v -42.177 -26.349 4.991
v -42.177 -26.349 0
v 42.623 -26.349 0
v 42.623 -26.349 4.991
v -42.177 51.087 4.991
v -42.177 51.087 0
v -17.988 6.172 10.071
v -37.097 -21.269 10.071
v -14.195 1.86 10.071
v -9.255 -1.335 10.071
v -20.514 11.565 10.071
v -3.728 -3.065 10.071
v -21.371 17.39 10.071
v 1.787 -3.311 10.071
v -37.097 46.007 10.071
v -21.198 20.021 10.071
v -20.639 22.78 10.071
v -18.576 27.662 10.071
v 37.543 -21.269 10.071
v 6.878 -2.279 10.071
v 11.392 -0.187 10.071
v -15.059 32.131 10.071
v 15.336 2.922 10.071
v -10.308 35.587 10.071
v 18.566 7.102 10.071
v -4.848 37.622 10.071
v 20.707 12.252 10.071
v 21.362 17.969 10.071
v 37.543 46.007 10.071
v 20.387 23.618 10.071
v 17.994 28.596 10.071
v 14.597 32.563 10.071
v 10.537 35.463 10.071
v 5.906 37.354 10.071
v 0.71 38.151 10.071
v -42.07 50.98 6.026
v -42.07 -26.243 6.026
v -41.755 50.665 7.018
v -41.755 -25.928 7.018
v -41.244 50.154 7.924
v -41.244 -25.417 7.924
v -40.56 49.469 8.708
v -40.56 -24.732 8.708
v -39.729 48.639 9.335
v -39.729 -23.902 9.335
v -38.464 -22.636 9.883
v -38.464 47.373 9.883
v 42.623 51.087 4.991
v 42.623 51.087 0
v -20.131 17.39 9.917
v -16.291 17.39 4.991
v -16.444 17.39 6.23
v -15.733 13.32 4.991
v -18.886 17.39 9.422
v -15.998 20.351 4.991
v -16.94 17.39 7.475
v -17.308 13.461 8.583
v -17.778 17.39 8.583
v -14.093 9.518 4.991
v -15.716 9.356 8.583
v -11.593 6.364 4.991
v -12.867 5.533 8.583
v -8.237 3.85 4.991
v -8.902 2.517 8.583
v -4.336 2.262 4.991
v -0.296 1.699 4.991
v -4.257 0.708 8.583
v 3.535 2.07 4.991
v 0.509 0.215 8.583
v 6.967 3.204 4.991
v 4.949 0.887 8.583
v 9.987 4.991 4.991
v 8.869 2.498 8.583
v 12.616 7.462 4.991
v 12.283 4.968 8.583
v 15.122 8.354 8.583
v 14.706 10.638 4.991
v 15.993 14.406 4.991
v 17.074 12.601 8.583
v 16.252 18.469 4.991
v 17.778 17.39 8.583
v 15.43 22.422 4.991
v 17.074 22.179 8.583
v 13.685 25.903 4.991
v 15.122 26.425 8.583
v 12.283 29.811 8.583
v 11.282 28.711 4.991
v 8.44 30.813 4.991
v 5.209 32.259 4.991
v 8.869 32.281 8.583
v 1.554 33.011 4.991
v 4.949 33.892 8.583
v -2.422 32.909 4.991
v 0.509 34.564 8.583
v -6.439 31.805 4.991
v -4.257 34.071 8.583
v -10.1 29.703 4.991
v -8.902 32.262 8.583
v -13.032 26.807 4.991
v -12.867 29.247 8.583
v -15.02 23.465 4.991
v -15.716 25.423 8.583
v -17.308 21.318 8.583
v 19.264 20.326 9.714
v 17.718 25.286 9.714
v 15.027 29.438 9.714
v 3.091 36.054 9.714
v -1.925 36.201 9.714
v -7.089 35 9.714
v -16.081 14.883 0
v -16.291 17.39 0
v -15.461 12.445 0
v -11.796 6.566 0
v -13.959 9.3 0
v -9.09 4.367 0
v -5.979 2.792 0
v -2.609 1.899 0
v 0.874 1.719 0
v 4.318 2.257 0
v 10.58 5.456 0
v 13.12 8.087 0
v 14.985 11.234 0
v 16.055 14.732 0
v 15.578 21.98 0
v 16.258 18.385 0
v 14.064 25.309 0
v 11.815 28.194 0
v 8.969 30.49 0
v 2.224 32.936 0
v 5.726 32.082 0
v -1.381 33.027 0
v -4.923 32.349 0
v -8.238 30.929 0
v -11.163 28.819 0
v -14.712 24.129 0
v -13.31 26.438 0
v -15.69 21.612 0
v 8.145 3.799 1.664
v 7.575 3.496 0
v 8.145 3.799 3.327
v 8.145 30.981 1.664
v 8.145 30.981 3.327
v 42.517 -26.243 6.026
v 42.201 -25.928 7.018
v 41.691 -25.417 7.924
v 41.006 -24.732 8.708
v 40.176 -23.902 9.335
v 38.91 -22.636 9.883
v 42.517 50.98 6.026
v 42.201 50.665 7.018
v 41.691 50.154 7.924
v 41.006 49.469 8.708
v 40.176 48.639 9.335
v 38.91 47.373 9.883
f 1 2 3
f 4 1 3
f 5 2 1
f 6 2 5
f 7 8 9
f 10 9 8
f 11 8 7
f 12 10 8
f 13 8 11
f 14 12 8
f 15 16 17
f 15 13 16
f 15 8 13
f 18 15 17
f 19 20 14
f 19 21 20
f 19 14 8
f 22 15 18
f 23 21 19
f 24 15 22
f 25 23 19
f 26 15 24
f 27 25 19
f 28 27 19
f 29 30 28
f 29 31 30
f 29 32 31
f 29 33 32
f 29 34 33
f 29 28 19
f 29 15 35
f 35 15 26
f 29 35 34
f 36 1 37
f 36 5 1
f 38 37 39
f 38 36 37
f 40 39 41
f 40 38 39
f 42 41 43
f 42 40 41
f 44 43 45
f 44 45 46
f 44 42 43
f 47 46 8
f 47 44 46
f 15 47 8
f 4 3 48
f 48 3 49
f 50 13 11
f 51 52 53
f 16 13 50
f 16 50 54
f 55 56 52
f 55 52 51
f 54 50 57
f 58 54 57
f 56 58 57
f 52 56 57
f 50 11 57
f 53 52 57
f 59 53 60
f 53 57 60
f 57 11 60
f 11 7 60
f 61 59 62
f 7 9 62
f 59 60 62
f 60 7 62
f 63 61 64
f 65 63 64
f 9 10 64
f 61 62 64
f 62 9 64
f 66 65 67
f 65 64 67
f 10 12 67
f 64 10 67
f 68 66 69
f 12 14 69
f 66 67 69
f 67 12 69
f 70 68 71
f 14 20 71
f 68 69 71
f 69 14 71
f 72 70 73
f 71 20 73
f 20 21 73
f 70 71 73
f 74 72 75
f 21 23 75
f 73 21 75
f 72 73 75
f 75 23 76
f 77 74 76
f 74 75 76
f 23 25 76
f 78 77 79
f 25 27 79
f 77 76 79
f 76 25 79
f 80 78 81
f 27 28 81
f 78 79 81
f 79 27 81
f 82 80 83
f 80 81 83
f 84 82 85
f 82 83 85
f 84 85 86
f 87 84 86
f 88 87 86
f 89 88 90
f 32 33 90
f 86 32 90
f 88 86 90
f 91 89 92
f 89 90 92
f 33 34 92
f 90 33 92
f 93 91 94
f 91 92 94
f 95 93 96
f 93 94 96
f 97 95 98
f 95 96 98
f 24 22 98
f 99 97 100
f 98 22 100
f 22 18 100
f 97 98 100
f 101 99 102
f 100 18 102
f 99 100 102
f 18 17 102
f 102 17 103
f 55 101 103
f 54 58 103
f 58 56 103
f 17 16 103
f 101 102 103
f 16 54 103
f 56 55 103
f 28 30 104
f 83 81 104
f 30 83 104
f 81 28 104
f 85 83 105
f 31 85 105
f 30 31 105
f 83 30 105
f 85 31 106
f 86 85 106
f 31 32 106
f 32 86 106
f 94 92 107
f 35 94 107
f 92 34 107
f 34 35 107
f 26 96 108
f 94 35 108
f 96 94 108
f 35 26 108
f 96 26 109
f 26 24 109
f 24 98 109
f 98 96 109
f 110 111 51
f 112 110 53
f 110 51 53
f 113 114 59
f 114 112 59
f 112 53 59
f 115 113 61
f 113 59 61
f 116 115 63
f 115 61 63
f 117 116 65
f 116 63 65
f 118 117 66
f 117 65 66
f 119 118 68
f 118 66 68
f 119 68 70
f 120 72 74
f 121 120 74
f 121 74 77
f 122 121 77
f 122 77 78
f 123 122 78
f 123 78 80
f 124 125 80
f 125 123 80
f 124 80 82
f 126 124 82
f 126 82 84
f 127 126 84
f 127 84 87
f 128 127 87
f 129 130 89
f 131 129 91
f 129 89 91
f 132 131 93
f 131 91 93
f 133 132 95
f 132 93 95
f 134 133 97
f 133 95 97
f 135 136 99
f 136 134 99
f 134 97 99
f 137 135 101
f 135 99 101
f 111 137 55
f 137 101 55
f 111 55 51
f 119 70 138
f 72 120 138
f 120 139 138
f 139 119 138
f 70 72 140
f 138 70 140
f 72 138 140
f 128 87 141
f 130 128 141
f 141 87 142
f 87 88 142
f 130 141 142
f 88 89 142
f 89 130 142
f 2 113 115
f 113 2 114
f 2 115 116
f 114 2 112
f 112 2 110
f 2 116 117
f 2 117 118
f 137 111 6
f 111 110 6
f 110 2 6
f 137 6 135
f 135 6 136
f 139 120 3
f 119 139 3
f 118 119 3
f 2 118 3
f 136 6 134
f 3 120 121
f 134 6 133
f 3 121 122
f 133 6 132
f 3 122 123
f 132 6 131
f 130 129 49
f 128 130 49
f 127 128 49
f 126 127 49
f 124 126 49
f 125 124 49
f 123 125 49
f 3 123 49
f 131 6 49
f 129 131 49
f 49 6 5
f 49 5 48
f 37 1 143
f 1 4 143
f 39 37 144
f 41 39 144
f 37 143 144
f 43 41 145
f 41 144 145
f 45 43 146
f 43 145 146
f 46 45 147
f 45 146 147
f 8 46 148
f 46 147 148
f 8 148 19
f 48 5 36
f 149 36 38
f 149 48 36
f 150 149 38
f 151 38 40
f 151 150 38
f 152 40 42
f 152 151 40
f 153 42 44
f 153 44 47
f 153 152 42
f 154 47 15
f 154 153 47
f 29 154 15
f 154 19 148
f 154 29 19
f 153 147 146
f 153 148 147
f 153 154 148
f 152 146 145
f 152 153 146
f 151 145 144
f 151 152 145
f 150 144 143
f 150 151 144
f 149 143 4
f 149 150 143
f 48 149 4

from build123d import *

# Parameters (mm, degrees)
F0_W     = 84.8001912236
F0_H     = 77.4359703064
F1_DEPTH = 10.0706256926
F3_DEPTH = 86.0751271248
F4_R     = 5.08


with BuildPart() as f1:
    # F0 (on Top) → F1 (new body)
    with BuildSketch(Plane.XY):
        with Locations((0.2231411636, 12.3685747385)):
            Rectangle(F0_W, F0_H)
    extrude(amount=F1_DEPTH)

    # F2 (on face) → F3 (cut)
    with BuildSketch(Plane.XY.offset(10.0706256926)):
        with BuildLine():
            add(Edge.make_bspline(
                [(-16.2905976176, 17.3896253109), (-16.2905976176, -9.7921567435), (8.1452988088, 3.7987342837), (32.5811952353, 17.3896253109), (8.1452988088, 30.9805163381), (-16.2905976176, 44.5714073653), (-16.2905976176, 17.3896253109)],
                knots=[0, 0, 0, 2.0943951024, 2.0943951024, 4.1887902048, 4.1887902048, 6.2831853072, 6.2831853072, 6.2831853072], degree=2, weights=[1, 0.5, 1, 0.5, 1, 0.5, 1]))
        make_face()
    extrude(amount=-F3_DEPTH, mode=Mode.SUBTRACT)

    # F4
    f4_edges = [f1.edges().sort_by_distance(p)[0] for p in [
        (-42.176954, 12.368575, 10.070626),
        (0.223141, 51.08656, 10.070626),
        (0.223141, -26.34941, 10.070626),
        (42.623237, 12.368575, 10.070626),
        (16.290598, 17.389625, 10.070626),
    ]]
    fillet(f4_edges, radius=F4_R)


solid = f1.part
